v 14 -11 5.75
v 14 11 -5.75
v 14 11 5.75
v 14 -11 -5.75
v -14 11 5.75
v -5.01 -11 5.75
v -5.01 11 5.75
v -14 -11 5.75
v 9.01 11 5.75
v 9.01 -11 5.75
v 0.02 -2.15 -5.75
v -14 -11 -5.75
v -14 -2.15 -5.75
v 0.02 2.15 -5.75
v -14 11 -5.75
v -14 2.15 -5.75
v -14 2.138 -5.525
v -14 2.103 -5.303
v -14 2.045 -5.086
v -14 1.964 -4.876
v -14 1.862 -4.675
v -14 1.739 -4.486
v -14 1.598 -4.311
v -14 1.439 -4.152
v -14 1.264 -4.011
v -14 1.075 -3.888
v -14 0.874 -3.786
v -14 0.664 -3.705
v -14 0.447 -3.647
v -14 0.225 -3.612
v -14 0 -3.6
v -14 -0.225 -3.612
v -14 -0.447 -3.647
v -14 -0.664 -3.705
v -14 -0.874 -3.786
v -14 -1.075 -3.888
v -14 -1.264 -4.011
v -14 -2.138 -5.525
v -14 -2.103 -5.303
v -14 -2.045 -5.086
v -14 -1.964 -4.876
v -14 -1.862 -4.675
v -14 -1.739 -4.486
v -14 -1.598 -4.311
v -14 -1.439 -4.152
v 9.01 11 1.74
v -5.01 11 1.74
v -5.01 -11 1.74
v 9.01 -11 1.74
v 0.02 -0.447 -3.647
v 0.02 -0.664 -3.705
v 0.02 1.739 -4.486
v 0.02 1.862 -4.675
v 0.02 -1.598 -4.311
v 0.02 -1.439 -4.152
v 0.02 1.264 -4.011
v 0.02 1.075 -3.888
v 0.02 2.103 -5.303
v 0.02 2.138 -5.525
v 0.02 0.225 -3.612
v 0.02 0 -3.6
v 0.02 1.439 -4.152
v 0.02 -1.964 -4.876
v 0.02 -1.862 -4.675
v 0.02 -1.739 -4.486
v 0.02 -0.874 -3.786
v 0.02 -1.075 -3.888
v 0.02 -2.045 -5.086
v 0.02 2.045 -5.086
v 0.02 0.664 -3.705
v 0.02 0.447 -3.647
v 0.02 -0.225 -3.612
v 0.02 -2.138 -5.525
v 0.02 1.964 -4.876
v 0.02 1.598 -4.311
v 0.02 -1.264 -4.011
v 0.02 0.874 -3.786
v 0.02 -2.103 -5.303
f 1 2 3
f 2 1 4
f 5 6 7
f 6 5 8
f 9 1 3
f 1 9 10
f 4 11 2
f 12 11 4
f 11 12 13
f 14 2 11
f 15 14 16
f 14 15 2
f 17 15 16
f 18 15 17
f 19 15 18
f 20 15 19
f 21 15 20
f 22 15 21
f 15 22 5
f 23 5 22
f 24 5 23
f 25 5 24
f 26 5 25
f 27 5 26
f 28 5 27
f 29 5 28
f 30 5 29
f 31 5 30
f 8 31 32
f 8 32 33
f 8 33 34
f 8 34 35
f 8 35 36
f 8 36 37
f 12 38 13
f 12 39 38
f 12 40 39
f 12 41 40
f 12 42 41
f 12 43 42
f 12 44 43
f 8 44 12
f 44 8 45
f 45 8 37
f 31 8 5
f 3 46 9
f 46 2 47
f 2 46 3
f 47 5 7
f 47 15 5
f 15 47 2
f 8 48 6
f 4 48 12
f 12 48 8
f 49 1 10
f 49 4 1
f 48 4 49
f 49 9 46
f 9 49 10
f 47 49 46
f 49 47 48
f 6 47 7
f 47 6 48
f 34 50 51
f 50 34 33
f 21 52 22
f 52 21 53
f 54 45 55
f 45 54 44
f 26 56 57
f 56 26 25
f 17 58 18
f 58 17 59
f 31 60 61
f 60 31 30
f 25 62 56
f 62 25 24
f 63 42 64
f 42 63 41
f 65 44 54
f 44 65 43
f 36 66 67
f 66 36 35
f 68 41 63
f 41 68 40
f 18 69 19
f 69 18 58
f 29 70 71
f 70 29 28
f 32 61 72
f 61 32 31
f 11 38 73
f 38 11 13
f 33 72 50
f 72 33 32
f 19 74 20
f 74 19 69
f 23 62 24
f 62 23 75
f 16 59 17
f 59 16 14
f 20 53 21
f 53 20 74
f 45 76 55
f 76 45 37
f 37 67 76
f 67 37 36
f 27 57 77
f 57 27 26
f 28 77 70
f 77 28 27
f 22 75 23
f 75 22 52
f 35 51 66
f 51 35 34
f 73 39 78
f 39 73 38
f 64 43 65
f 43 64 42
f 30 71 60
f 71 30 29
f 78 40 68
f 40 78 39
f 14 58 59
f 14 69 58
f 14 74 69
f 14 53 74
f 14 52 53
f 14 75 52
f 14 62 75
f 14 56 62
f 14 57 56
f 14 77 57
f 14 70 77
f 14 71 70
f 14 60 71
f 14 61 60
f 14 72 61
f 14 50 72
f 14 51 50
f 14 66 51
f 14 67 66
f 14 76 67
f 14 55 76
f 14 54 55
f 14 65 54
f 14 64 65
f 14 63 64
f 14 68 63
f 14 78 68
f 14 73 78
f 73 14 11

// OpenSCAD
// Snap panel clip with a U-shaped panel slot.
$fn = 60;
eps = 0.02;
panel_t = 3.5;
clip_w = 22;
clip_l = 28;
clip_h = panel_t + 8;
slot = panel_t + 0.5;
difference() {
    cube([clip_l,clip_w,clip_h],center=true);
    translate([2,0,clip_h/2-slot/2]) cube([clip_l/2+eps,clip_w+2*eps,slot+eps],center=true);
    translate([-clip_l/2-eps,0,-clip_h/2]) rotate([0,90,0]) cylinder(d=4.3,h=clip_l/2+2*eps);
}
